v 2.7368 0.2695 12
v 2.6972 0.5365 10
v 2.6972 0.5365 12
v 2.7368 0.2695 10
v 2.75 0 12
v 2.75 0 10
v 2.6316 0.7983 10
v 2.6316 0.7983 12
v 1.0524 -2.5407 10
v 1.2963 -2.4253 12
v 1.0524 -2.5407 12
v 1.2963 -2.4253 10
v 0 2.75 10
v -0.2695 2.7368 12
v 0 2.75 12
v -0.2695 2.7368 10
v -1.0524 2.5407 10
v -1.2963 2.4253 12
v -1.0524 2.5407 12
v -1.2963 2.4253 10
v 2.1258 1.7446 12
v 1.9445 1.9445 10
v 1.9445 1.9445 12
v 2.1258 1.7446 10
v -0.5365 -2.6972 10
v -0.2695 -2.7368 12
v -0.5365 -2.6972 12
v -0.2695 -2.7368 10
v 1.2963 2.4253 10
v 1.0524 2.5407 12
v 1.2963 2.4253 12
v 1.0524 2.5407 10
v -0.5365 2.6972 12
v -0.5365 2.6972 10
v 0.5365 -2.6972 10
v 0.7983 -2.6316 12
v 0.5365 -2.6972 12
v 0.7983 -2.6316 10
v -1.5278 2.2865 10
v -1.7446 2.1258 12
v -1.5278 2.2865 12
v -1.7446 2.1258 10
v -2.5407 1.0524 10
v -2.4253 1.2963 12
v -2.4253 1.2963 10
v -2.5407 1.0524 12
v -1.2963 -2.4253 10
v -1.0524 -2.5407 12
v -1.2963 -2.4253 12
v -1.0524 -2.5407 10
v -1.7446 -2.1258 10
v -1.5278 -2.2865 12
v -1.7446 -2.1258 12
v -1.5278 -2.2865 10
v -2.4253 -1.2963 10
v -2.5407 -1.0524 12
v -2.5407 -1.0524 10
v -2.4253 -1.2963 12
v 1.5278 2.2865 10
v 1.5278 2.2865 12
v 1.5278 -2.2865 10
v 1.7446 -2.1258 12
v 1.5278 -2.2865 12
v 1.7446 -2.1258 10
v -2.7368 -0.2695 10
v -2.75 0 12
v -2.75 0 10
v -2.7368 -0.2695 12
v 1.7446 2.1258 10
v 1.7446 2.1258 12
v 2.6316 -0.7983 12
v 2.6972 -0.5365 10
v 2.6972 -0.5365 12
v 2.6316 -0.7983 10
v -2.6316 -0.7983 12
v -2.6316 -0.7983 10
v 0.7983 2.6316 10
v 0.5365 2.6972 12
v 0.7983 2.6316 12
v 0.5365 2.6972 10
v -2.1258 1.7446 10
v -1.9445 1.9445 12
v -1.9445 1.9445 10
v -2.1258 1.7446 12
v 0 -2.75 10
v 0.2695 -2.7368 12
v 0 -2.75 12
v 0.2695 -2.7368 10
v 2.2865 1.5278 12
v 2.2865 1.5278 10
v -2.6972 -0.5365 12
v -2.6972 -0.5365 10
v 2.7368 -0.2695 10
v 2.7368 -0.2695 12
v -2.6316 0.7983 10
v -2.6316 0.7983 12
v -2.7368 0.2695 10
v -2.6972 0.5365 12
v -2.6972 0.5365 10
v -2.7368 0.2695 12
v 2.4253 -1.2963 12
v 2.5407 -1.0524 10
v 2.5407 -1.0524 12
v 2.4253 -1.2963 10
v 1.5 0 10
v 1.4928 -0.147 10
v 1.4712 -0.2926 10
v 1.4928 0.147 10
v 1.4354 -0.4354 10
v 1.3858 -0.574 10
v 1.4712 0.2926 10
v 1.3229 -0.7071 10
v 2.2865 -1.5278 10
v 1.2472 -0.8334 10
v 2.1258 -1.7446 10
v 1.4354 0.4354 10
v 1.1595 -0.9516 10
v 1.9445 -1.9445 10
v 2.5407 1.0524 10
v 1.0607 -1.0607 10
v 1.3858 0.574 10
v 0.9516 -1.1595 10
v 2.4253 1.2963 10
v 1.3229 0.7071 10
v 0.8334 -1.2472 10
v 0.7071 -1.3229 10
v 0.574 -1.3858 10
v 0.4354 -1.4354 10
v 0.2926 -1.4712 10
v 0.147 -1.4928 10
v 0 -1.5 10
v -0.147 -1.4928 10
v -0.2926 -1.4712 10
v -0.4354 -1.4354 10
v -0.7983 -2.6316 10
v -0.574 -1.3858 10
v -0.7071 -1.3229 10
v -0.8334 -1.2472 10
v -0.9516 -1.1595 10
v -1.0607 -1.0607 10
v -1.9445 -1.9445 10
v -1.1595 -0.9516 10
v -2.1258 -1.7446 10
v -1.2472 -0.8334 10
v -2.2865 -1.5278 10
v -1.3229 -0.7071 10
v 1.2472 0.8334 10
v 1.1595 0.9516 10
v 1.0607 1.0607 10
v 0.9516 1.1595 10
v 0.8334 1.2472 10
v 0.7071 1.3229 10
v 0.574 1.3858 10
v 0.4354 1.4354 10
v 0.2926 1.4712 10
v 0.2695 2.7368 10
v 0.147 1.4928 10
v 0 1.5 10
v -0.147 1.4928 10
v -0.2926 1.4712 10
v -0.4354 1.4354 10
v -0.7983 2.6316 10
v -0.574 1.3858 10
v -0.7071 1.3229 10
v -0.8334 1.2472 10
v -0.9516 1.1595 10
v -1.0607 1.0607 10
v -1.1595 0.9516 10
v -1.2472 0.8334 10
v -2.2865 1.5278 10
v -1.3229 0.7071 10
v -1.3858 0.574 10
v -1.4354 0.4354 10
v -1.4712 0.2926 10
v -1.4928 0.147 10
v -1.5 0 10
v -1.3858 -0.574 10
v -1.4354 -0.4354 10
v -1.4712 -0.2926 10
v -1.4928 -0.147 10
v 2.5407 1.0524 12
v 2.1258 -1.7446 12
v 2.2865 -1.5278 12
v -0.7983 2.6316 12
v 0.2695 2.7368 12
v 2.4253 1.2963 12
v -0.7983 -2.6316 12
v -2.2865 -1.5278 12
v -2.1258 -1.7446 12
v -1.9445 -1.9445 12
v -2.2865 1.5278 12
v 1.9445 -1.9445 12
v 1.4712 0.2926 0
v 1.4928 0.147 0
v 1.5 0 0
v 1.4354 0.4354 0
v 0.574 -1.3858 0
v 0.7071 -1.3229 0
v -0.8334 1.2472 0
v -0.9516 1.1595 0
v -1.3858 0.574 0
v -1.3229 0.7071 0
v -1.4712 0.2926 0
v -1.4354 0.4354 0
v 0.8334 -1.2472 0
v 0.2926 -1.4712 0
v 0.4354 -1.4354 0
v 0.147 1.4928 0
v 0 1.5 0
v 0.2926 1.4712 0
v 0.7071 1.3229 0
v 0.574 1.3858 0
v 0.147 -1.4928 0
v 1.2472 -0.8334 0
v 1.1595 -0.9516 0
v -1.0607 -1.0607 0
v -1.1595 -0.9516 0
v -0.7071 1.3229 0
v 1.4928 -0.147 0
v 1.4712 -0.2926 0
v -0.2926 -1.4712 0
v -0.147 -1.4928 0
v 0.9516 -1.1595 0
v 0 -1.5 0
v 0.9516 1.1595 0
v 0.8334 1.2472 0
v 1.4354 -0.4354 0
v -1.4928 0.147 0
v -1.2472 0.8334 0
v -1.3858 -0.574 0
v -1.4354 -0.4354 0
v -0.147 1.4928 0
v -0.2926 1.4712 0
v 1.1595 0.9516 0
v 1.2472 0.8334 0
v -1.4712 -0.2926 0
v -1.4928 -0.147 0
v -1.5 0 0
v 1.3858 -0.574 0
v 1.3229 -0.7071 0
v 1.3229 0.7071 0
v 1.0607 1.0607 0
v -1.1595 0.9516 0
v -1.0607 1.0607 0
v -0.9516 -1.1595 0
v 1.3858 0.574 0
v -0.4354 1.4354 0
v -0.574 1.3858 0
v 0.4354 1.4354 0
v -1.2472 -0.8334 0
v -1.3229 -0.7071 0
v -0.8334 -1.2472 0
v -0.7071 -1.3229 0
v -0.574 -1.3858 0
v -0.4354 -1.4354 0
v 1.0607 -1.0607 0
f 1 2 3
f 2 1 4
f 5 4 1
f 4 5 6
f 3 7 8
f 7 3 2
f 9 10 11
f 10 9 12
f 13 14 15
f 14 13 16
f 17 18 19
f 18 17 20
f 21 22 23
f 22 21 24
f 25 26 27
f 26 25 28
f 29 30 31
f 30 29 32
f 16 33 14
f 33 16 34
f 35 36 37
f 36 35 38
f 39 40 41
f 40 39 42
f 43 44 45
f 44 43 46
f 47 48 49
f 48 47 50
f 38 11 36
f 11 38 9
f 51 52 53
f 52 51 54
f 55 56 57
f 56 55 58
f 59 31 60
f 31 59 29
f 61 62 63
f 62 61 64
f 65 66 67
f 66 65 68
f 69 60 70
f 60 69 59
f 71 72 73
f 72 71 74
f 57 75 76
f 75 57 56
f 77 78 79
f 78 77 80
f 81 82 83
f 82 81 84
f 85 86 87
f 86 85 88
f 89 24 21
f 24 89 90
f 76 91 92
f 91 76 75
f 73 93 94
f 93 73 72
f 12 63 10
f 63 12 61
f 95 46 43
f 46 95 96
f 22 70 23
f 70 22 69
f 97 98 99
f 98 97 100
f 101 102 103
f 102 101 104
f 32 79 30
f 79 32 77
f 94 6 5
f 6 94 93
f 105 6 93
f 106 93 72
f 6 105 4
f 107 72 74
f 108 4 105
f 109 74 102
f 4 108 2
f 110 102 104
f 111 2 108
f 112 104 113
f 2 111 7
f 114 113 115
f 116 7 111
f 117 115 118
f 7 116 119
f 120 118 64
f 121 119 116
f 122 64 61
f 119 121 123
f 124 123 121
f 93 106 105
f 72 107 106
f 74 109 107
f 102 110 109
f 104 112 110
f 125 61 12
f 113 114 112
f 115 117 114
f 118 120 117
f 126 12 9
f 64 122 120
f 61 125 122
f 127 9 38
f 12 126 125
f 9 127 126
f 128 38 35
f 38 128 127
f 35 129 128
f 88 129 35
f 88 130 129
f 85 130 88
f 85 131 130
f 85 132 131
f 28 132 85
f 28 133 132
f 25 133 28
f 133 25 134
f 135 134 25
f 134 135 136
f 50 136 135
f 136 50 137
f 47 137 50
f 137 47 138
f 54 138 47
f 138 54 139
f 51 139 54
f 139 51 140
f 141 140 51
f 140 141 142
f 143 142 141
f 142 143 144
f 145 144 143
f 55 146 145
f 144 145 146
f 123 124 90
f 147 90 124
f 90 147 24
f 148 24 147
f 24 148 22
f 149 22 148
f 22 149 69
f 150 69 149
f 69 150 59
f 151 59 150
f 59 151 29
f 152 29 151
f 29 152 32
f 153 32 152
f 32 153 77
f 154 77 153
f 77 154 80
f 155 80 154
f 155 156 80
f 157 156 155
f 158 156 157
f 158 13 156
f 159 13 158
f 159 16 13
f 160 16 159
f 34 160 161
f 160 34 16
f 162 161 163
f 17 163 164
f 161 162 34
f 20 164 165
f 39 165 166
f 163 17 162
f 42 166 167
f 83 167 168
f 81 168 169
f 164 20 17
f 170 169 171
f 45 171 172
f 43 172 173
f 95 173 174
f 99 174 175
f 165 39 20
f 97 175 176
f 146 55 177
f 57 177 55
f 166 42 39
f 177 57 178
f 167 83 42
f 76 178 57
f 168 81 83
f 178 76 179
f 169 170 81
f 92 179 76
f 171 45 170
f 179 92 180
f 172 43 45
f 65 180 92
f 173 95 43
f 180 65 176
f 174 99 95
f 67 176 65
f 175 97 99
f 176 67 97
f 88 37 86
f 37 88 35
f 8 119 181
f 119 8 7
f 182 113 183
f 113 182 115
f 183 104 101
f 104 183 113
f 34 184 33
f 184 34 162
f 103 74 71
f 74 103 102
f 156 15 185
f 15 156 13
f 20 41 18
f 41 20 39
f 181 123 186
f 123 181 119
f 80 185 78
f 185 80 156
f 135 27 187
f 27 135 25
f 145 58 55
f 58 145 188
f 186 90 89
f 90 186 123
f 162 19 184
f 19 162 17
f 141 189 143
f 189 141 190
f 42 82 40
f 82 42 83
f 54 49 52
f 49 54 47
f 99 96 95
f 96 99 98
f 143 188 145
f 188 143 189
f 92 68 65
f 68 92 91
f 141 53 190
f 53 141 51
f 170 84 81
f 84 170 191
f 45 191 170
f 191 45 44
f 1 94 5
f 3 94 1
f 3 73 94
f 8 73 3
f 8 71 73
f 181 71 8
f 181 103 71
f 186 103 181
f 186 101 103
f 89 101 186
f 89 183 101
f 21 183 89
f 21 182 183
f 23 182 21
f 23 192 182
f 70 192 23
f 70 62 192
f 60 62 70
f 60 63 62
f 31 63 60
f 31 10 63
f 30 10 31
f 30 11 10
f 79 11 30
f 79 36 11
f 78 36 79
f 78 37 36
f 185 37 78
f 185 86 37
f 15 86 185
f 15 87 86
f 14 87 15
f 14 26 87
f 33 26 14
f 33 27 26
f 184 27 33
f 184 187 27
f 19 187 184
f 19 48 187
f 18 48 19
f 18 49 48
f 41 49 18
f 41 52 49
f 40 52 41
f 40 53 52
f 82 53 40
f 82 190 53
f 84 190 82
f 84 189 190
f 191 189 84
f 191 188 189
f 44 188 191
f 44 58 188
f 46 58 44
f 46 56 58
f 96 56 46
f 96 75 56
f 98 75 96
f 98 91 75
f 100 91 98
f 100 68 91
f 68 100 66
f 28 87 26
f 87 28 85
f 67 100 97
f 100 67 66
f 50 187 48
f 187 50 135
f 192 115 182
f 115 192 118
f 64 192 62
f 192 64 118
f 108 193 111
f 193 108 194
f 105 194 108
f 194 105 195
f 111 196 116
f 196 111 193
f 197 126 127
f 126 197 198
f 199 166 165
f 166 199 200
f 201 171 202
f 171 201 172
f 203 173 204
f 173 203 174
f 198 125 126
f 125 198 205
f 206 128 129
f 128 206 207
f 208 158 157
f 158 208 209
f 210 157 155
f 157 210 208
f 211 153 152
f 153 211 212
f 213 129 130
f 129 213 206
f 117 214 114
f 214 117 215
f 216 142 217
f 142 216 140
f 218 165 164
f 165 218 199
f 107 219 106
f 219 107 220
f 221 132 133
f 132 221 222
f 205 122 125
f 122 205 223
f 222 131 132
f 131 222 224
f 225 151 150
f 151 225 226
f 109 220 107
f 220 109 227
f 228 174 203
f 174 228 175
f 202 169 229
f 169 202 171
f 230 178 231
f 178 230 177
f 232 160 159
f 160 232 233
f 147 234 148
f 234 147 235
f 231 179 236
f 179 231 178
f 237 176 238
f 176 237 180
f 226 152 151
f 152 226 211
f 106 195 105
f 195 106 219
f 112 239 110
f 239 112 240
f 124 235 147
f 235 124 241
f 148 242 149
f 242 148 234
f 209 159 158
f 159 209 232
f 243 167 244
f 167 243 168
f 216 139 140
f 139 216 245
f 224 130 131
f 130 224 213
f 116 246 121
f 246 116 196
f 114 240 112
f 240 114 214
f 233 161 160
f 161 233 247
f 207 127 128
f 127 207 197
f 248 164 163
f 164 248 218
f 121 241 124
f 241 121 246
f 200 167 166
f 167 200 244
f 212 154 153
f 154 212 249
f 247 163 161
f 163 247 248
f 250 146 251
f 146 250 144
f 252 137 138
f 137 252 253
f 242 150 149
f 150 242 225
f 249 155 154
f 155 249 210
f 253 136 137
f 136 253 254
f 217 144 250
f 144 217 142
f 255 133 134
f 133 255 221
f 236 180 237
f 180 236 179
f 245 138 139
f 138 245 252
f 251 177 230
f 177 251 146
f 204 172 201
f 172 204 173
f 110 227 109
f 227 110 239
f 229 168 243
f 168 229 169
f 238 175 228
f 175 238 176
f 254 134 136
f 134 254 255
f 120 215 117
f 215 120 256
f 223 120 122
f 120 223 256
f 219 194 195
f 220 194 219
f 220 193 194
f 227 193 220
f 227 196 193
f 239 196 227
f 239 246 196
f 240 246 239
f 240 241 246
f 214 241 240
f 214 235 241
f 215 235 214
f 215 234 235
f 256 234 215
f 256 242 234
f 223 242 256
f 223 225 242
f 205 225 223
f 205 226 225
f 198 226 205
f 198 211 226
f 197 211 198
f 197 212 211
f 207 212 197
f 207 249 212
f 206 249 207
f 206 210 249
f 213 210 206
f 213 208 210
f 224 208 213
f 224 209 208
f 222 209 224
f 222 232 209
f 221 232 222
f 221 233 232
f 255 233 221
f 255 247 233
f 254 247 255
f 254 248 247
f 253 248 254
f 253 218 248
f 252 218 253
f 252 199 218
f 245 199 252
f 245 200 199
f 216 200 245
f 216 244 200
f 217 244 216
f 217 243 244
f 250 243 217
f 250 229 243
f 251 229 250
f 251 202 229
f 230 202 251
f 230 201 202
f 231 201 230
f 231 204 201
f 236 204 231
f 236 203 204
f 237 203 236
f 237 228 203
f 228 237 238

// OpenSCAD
module socket_head_cap_screw() {
    union() {
        // Screw head
        translate([0, 0, 10])
            cylinder(h = 2.0, d = 5.5, $fn = 64);
        
        // Screw shaft
        cylinder(h = 10, d = 3.0, $fn = 64);
        
        // Hex socket
        translate([0, 0, 10])
            cylinder(h = 2.0, d = 3.0, $fn = 6);
    }
}

socket_head_cap_screw();
